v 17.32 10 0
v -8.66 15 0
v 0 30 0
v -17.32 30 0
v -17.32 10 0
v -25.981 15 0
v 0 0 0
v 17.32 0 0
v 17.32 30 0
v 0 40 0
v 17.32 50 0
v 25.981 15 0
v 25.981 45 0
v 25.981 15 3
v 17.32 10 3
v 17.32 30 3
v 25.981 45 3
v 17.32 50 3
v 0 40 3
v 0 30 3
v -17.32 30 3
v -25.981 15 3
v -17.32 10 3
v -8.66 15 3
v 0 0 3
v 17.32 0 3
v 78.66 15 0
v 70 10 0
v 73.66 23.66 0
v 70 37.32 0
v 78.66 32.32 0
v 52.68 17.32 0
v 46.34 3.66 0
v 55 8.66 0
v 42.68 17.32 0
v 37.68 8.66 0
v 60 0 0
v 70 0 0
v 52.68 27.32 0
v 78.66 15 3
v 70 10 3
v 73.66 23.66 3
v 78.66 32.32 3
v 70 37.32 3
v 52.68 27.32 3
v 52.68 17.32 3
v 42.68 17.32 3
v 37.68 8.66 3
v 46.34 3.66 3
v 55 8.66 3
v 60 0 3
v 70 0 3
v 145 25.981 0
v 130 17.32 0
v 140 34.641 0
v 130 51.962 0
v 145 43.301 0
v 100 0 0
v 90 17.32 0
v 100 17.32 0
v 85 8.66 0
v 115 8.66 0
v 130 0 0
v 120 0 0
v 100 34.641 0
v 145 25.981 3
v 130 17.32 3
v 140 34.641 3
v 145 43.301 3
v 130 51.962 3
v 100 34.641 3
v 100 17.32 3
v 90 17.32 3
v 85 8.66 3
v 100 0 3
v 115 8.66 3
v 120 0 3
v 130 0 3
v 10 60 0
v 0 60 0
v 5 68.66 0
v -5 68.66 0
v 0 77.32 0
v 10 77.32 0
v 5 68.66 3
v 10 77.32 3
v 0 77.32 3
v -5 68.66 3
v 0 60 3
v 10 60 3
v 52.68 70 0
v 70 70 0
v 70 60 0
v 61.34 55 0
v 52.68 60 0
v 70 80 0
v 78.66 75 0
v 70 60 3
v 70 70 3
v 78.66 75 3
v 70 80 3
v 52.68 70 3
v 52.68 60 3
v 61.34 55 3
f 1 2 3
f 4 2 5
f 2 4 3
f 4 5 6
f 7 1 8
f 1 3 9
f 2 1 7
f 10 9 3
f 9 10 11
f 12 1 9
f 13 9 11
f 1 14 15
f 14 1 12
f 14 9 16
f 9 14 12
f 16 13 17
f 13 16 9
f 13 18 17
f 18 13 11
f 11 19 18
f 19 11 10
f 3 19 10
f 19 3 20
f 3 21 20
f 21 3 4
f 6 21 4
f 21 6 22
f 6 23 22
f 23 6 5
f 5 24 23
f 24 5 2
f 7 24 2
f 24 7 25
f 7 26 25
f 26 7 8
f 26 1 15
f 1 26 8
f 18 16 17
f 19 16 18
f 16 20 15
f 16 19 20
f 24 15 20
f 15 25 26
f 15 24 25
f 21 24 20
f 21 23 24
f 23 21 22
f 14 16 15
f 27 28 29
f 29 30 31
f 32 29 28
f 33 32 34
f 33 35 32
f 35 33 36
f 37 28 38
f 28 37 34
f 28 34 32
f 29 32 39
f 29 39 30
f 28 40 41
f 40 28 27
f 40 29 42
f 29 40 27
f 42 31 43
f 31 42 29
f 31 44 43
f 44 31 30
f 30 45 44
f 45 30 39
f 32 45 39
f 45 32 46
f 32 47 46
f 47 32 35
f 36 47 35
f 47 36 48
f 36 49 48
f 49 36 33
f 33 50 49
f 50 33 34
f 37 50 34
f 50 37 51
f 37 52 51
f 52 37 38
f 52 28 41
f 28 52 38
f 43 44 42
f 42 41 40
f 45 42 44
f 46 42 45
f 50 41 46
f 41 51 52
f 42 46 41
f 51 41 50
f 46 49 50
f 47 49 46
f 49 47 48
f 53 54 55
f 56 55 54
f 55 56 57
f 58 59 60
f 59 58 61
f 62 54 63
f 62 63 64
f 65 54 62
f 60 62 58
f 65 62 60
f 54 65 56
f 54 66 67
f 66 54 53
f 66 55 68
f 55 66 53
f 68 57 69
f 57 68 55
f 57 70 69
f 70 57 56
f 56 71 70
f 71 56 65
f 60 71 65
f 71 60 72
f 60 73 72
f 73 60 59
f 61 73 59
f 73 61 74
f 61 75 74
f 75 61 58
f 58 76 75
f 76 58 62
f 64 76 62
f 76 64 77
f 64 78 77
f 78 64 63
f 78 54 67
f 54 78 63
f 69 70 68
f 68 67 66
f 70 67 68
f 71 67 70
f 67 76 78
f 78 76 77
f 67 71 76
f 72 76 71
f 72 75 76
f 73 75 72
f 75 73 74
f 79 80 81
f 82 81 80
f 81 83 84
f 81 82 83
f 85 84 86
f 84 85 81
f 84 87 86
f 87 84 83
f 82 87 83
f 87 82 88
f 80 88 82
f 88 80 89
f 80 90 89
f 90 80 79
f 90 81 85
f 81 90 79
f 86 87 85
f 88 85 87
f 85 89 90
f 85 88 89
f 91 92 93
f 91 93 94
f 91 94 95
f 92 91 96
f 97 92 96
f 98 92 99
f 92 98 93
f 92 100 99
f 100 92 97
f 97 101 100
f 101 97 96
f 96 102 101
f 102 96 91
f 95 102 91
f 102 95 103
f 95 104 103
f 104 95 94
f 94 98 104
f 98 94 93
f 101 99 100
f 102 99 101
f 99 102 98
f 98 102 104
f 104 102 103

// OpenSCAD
// Einstein Tiles

// Which colors to print.
COLOR_FILTER = "all"; // ["all", "blue", "red"]

UNIT = 10;
THICKNESS = 3;

/* [Hidden] */

// Construction of "Hat" (or "T-Shirt") from union of kites
module union_tile() {
  TGRID = 20;
  P0 = [0, 0];
  P1 = [TGRID, 0];
  P2 = P1 * rot(60);
  P3 = (P0 + P1 + P2) / 3;

  kite_v = [P0, P1/2, P3, P2/2];
  ks = [for (i=[0:5]) kite_v*rot(60*i)];
      
  parts = [ks[0], ks[1], ks[4], ks[5],
           add(ks[1], P1), add(ks[2], P1),
           add(ks[3], P2), add(ks[4], P2)
          ];

  color_part("blue")
      linear_extrude(THICKNESS/2) {
          for (p=parts) polygon(p);
      }
  color_part("red")
      translate([0, 0, THICKNESS/2])
      linear_extrude(THICKNESS/2) {
          for (p=parts) polygon(p);   
      }    
}

// Construction as a path of vectors.  This is more
// amenable to generating the whole family of Tile(a,b)
// tiles, where:
// Tile(1, sqrt(3)) = "Hat"
// Tile(sqrt(3), 1) = "Turtle"
// Tile(1,1) = basis of Spectre 
// Tile(0, 1) = "Chevron"
// Tile(1, 0) = "Comet"
function tile_v(a, b) = cumvec([
    [0, b], [90, a], [30, a], [120, b], [60, b], [150, a],
    [210, a], [210, a], [270, a], [180, b], [240, b], [330, a], [30, a]
    ]);
    
module tile_half(a, b) {
  vecs = UNIT * tile_v(a, b);
  linear_extrude(THICKNESS/2)
    polygon(vecs, convexity=2);
}

module tile(a=1, b=sqrt(3)) {
  color_part("blue") tile_half(a, b);
  translate([0, 0, THICKNESS/2])
    color_part("red") tile_half(a, b);
}

if (is_undef(no_side_effects)) {
  tile(1, sqrt(3));
  translate([6 * UNIT, 0, 0])
    tile(1, 1);
  translate([12 * UNIT, 0, 0])
    tile(sqrt(3), 1);
  translate([0, 6 * UNIT, 0])
    tile(0, 1);
  translate([7 * UNIT, 6 * UNIT, 0])
    tile(1, 0);
}

function rot(a) = [[cos(a), sin(a)], [-sin(a), cos(a)]];
function add(poly, o) = [for (p=poly) p + o];
function cumsum(v) = [for (i=0, b=v[0]; i < len(v); i=i+1, b=(i<len(v)?b+v[i]:b)) b];
function cumvec(v) = cumsum([[0, 0], each [for (s=v) s[1]*[cos(s[0]), sin(s[0])]]]);

// Need to be able to conditionally render parts based on color (for
// export to Bambu Studio for slicing.
module color_part(c) {
    if (COLOR_FILTER == "all" || c == COLOR_FILTER) {
        color(c) children();
    }
}
